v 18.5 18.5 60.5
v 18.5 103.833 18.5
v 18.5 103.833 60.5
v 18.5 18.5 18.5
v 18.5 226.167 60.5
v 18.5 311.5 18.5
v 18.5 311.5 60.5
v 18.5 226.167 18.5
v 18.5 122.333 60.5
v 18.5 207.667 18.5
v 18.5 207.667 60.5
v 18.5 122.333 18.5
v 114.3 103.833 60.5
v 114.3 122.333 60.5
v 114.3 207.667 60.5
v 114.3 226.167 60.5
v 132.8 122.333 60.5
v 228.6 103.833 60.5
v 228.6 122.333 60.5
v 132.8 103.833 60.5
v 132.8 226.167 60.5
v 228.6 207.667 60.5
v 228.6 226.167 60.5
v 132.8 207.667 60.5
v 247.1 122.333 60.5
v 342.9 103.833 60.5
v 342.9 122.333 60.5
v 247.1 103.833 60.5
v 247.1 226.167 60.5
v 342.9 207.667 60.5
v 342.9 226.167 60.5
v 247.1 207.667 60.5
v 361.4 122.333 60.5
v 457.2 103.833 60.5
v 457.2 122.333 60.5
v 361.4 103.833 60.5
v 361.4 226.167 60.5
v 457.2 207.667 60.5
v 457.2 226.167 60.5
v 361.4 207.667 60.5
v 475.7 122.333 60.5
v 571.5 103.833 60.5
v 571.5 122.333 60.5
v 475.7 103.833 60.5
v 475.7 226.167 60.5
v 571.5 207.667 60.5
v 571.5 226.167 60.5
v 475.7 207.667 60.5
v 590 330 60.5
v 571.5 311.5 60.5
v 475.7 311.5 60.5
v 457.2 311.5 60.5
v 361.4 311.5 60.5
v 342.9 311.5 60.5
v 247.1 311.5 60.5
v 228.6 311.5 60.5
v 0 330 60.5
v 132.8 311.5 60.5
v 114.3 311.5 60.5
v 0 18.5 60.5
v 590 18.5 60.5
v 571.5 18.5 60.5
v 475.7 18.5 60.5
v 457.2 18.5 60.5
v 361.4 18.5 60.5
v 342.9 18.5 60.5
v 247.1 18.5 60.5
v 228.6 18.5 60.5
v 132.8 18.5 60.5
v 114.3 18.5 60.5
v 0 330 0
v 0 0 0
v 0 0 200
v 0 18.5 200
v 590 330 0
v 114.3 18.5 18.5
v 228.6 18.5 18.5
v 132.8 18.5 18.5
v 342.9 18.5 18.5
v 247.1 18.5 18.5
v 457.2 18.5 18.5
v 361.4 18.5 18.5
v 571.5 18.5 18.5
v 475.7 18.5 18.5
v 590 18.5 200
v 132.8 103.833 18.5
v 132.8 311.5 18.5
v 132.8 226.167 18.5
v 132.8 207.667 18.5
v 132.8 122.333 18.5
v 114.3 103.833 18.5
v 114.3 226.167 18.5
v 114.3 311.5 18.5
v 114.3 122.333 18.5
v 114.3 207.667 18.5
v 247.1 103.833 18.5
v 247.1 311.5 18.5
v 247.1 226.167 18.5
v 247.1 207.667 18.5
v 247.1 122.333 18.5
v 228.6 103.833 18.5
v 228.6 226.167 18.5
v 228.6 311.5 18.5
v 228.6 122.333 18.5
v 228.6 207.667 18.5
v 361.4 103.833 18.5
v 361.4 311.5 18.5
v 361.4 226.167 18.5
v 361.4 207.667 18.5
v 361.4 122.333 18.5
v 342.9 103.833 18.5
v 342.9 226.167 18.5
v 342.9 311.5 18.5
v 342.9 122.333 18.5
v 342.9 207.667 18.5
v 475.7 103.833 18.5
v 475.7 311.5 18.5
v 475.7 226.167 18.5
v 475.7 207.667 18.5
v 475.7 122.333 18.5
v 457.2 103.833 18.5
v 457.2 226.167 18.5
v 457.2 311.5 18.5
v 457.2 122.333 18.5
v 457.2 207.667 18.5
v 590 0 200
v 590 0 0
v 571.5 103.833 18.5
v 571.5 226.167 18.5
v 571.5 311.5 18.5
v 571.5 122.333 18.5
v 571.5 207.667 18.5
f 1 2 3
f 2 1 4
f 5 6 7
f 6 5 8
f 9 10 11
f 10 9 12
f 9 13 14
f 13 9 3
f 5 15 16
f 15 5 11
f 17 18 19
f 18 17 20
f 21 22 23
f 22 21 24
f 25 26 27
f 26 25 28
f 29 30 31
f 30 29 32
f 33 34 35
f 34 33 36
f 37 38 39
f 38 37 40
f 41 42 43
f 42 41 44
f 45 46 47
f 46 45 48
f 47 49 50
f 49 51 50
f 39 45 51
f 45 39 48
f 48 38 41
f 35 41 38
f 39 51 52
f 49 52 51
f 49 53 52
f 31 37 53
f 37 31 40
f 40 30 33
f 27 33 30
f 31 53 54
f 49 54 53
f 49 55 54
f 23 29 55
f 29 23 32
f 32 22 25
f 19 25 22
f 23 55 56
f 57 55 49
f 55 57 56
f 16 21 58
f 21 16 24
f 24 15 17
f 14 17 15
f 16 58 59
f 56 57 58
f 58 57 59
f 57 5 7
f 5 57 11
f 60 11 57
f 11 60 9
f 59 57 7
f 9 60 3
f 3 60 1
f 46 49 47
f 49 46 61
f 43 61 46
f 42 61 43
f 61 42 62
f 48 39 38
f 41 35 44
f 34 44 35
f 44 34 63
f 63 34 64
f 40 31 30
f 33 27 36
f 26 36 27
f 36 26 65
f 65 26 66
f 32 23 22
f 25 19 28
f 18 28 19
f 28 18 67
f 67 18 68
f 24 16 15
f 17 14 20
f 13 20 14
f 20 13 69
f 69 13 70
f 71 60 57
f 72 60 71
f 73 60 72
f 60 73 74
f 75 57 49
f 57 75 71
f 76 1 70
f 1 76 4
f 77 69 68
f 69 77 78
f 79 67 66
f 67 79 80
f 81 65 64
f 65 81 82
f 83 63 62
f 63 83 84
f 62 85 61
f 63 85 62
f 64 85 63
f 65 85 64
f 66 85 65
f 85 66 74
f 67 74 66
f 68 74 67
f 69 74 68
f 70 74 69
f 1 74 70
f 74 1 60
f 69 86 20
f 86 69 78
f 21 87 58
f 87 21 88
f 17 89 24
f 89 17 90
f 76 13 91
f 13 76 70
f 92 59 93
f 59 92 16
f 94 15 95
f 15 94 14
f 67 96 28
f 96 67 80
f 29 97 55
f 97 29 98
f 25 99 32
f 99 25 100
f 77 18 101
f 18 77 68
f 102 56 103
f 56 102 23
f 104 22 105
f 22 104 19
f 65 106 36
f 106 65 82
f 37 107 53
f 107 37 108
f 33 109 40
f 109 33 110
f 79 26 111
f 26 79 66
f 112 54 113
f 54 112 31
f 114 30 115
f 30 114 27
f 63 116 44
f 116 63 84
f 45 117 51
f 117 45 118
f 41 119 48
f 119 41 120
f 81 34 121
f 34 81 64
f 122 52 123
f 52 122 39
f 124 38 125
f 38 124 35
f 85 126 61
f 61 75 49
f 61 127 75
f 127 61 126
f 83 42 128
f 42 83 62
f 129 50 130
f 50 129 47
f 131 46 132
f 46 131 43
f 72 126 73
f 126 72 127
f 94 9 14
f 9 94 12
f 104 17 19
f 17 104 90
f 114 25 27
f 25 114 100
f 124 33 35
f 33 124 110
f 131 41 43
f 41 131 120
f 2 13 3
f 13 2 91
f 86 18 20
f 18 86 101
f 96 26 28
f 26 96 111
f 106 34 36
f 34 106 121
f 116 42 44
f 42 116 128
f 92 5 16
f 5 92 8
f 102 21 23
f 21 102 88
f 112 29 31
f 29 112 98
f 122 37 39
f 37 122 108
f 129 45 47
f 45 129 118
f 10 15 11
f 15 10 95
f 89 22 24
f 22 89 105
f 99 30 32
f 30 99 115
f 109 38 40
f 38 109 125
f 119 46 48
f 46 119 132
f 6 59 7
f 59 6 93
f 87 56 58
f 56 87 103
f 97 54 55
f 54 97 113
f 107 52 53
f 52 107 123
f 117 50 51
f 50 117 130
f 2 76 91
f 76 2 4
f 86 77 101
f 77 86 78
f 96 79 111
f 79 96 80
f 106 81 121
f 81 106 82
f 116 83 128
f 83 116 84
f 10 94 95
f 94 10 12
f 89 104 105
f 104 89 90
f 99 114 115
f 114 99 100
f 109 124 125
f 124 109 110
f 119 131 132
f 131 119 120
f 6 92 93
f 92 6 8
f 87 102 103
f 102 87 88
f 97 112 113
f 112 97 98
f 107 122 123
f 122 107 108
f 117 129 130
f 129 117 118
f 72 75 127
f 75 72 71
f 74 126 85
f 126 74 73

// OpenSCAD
dikte =18.5;
lengte = 590;
hoogte = 330;
diepte = 200;
aantalSteunVerticaal = 5;
aantalSteunHorizontaal = 3;

diepteInfrezing = 8;
hoogteSteun = 50;

//explode();
rolluikkasten();
//horizontaalSteun();
//verticaalSteun();

module explode(){
    translate([0,hoogte*2,0]){
difference(){
  square ([lengte,hoogte],center = false);
projection(cut=true) rolluikkastenExplode();
}
translate([0, (-diepte) -50,0]){
 
projection(cut=true) onderplaat();

  
}
}
  
//horizontaal   
for ( i = [0 :hoogteSteun +20: hoogteSteun *aantalSteunHorizontaal ] )
{
    translate([0,-i,0]){
        projection (cut=true) horizontaalSteun();
}
}

//verticaal
for ( i = [0 :hoogte+50:  (hoogte +50)* aantalSteunVerticaal ] )
{
translate([hoogte + i, 100, 0]){
rotate([0,0,90]){
projection (cut= true) verticaalSteun();
}
}
}
}
 module rolluikkasten(){
        
// difference(){
cube([lengte,hoogte,dikte], center=false);
translate([0,0,dikte]){
cube([lengte,dikte,diepte-dikte], center=false);
}

for ( i = [0 :  (lengte-dikte)/aantalSteunVerticaal: lengte] )
{
    translate([i,dikte,dikte-diepteInfrezing]){
cube([dikte,hoogte-dikte,hoogteSteun], center=false);
}
}
for ( i = [0 :  (hoogte-dikte)/aantalSteunHorizontaal: hoogte] )
{

 translate([0,i,dikte-diepteInfrezing]){
cube([lengte,dikte,hoogteSteun], center=false);
}
}

{   
//}
}
}

module rolluikkastenExplode(){

 difference(){
cube([lengte,hoogte,dikte], center=false);
translate([0,0,dikte]){
cube([lengte,dikte,diepte-dikte], center=false);
}

for ( i = [0 :  (lengte-dikte)/aantalSteunVerticaal: lengte] )
{
    translate([i,0,0]){
cube([dikte,hoogte,hoogteSteun], center=false);
}
}
for ( i = [0 :  (hoogte-dikte)/aantalSteunHorizontaal: hoogte] )
{

 translate([0,i,0]){
cube([lengte,dikte,hoogteSteun], center=false);
}
}

{   
}
}
}
module horizontaalSteun(){

   
 difference(){
        
 translate([0,0,0]){
cube([lengte,hoogteSteun,dikte], center=false);

} 

for ( i = [0 :  (lengte-dikte)/aantalSteunVerticaal: lengte] )
{
    translate([i,0,0]){
cube([dikte,hoogteSteun/2,hoogte-dikte,], center=false);

}

}
}
}

module verticaalSteun(){

   
 difference(){
translate([0,diepteInfrezing,0]){
cube([hoogteSteun,hoogte-diepteInfrezing,dikte], center=false);
}
for ( i = [0 :  (hoogte-dikte)/aantalSteunHorizontaal: hoogte] )
{

 translate([0,i,0]){
cube([hoogteSteun/2,dikte,dikte*2], center=false);
     
}
}


}
}

module onderplaat(){

   
 difference(){
        
 translate([0,0,0]){
cube([lengte,diepte,dikte], center=false);

} 

for ( i = [0 :  (lengte-dikte)/aantalSteunVerticaal: lengte] )
{
    translate([i,0,0]){
cube([dikte,hoogteSteun/2,hoogte-dikte], center=false);

}

}
}
}


